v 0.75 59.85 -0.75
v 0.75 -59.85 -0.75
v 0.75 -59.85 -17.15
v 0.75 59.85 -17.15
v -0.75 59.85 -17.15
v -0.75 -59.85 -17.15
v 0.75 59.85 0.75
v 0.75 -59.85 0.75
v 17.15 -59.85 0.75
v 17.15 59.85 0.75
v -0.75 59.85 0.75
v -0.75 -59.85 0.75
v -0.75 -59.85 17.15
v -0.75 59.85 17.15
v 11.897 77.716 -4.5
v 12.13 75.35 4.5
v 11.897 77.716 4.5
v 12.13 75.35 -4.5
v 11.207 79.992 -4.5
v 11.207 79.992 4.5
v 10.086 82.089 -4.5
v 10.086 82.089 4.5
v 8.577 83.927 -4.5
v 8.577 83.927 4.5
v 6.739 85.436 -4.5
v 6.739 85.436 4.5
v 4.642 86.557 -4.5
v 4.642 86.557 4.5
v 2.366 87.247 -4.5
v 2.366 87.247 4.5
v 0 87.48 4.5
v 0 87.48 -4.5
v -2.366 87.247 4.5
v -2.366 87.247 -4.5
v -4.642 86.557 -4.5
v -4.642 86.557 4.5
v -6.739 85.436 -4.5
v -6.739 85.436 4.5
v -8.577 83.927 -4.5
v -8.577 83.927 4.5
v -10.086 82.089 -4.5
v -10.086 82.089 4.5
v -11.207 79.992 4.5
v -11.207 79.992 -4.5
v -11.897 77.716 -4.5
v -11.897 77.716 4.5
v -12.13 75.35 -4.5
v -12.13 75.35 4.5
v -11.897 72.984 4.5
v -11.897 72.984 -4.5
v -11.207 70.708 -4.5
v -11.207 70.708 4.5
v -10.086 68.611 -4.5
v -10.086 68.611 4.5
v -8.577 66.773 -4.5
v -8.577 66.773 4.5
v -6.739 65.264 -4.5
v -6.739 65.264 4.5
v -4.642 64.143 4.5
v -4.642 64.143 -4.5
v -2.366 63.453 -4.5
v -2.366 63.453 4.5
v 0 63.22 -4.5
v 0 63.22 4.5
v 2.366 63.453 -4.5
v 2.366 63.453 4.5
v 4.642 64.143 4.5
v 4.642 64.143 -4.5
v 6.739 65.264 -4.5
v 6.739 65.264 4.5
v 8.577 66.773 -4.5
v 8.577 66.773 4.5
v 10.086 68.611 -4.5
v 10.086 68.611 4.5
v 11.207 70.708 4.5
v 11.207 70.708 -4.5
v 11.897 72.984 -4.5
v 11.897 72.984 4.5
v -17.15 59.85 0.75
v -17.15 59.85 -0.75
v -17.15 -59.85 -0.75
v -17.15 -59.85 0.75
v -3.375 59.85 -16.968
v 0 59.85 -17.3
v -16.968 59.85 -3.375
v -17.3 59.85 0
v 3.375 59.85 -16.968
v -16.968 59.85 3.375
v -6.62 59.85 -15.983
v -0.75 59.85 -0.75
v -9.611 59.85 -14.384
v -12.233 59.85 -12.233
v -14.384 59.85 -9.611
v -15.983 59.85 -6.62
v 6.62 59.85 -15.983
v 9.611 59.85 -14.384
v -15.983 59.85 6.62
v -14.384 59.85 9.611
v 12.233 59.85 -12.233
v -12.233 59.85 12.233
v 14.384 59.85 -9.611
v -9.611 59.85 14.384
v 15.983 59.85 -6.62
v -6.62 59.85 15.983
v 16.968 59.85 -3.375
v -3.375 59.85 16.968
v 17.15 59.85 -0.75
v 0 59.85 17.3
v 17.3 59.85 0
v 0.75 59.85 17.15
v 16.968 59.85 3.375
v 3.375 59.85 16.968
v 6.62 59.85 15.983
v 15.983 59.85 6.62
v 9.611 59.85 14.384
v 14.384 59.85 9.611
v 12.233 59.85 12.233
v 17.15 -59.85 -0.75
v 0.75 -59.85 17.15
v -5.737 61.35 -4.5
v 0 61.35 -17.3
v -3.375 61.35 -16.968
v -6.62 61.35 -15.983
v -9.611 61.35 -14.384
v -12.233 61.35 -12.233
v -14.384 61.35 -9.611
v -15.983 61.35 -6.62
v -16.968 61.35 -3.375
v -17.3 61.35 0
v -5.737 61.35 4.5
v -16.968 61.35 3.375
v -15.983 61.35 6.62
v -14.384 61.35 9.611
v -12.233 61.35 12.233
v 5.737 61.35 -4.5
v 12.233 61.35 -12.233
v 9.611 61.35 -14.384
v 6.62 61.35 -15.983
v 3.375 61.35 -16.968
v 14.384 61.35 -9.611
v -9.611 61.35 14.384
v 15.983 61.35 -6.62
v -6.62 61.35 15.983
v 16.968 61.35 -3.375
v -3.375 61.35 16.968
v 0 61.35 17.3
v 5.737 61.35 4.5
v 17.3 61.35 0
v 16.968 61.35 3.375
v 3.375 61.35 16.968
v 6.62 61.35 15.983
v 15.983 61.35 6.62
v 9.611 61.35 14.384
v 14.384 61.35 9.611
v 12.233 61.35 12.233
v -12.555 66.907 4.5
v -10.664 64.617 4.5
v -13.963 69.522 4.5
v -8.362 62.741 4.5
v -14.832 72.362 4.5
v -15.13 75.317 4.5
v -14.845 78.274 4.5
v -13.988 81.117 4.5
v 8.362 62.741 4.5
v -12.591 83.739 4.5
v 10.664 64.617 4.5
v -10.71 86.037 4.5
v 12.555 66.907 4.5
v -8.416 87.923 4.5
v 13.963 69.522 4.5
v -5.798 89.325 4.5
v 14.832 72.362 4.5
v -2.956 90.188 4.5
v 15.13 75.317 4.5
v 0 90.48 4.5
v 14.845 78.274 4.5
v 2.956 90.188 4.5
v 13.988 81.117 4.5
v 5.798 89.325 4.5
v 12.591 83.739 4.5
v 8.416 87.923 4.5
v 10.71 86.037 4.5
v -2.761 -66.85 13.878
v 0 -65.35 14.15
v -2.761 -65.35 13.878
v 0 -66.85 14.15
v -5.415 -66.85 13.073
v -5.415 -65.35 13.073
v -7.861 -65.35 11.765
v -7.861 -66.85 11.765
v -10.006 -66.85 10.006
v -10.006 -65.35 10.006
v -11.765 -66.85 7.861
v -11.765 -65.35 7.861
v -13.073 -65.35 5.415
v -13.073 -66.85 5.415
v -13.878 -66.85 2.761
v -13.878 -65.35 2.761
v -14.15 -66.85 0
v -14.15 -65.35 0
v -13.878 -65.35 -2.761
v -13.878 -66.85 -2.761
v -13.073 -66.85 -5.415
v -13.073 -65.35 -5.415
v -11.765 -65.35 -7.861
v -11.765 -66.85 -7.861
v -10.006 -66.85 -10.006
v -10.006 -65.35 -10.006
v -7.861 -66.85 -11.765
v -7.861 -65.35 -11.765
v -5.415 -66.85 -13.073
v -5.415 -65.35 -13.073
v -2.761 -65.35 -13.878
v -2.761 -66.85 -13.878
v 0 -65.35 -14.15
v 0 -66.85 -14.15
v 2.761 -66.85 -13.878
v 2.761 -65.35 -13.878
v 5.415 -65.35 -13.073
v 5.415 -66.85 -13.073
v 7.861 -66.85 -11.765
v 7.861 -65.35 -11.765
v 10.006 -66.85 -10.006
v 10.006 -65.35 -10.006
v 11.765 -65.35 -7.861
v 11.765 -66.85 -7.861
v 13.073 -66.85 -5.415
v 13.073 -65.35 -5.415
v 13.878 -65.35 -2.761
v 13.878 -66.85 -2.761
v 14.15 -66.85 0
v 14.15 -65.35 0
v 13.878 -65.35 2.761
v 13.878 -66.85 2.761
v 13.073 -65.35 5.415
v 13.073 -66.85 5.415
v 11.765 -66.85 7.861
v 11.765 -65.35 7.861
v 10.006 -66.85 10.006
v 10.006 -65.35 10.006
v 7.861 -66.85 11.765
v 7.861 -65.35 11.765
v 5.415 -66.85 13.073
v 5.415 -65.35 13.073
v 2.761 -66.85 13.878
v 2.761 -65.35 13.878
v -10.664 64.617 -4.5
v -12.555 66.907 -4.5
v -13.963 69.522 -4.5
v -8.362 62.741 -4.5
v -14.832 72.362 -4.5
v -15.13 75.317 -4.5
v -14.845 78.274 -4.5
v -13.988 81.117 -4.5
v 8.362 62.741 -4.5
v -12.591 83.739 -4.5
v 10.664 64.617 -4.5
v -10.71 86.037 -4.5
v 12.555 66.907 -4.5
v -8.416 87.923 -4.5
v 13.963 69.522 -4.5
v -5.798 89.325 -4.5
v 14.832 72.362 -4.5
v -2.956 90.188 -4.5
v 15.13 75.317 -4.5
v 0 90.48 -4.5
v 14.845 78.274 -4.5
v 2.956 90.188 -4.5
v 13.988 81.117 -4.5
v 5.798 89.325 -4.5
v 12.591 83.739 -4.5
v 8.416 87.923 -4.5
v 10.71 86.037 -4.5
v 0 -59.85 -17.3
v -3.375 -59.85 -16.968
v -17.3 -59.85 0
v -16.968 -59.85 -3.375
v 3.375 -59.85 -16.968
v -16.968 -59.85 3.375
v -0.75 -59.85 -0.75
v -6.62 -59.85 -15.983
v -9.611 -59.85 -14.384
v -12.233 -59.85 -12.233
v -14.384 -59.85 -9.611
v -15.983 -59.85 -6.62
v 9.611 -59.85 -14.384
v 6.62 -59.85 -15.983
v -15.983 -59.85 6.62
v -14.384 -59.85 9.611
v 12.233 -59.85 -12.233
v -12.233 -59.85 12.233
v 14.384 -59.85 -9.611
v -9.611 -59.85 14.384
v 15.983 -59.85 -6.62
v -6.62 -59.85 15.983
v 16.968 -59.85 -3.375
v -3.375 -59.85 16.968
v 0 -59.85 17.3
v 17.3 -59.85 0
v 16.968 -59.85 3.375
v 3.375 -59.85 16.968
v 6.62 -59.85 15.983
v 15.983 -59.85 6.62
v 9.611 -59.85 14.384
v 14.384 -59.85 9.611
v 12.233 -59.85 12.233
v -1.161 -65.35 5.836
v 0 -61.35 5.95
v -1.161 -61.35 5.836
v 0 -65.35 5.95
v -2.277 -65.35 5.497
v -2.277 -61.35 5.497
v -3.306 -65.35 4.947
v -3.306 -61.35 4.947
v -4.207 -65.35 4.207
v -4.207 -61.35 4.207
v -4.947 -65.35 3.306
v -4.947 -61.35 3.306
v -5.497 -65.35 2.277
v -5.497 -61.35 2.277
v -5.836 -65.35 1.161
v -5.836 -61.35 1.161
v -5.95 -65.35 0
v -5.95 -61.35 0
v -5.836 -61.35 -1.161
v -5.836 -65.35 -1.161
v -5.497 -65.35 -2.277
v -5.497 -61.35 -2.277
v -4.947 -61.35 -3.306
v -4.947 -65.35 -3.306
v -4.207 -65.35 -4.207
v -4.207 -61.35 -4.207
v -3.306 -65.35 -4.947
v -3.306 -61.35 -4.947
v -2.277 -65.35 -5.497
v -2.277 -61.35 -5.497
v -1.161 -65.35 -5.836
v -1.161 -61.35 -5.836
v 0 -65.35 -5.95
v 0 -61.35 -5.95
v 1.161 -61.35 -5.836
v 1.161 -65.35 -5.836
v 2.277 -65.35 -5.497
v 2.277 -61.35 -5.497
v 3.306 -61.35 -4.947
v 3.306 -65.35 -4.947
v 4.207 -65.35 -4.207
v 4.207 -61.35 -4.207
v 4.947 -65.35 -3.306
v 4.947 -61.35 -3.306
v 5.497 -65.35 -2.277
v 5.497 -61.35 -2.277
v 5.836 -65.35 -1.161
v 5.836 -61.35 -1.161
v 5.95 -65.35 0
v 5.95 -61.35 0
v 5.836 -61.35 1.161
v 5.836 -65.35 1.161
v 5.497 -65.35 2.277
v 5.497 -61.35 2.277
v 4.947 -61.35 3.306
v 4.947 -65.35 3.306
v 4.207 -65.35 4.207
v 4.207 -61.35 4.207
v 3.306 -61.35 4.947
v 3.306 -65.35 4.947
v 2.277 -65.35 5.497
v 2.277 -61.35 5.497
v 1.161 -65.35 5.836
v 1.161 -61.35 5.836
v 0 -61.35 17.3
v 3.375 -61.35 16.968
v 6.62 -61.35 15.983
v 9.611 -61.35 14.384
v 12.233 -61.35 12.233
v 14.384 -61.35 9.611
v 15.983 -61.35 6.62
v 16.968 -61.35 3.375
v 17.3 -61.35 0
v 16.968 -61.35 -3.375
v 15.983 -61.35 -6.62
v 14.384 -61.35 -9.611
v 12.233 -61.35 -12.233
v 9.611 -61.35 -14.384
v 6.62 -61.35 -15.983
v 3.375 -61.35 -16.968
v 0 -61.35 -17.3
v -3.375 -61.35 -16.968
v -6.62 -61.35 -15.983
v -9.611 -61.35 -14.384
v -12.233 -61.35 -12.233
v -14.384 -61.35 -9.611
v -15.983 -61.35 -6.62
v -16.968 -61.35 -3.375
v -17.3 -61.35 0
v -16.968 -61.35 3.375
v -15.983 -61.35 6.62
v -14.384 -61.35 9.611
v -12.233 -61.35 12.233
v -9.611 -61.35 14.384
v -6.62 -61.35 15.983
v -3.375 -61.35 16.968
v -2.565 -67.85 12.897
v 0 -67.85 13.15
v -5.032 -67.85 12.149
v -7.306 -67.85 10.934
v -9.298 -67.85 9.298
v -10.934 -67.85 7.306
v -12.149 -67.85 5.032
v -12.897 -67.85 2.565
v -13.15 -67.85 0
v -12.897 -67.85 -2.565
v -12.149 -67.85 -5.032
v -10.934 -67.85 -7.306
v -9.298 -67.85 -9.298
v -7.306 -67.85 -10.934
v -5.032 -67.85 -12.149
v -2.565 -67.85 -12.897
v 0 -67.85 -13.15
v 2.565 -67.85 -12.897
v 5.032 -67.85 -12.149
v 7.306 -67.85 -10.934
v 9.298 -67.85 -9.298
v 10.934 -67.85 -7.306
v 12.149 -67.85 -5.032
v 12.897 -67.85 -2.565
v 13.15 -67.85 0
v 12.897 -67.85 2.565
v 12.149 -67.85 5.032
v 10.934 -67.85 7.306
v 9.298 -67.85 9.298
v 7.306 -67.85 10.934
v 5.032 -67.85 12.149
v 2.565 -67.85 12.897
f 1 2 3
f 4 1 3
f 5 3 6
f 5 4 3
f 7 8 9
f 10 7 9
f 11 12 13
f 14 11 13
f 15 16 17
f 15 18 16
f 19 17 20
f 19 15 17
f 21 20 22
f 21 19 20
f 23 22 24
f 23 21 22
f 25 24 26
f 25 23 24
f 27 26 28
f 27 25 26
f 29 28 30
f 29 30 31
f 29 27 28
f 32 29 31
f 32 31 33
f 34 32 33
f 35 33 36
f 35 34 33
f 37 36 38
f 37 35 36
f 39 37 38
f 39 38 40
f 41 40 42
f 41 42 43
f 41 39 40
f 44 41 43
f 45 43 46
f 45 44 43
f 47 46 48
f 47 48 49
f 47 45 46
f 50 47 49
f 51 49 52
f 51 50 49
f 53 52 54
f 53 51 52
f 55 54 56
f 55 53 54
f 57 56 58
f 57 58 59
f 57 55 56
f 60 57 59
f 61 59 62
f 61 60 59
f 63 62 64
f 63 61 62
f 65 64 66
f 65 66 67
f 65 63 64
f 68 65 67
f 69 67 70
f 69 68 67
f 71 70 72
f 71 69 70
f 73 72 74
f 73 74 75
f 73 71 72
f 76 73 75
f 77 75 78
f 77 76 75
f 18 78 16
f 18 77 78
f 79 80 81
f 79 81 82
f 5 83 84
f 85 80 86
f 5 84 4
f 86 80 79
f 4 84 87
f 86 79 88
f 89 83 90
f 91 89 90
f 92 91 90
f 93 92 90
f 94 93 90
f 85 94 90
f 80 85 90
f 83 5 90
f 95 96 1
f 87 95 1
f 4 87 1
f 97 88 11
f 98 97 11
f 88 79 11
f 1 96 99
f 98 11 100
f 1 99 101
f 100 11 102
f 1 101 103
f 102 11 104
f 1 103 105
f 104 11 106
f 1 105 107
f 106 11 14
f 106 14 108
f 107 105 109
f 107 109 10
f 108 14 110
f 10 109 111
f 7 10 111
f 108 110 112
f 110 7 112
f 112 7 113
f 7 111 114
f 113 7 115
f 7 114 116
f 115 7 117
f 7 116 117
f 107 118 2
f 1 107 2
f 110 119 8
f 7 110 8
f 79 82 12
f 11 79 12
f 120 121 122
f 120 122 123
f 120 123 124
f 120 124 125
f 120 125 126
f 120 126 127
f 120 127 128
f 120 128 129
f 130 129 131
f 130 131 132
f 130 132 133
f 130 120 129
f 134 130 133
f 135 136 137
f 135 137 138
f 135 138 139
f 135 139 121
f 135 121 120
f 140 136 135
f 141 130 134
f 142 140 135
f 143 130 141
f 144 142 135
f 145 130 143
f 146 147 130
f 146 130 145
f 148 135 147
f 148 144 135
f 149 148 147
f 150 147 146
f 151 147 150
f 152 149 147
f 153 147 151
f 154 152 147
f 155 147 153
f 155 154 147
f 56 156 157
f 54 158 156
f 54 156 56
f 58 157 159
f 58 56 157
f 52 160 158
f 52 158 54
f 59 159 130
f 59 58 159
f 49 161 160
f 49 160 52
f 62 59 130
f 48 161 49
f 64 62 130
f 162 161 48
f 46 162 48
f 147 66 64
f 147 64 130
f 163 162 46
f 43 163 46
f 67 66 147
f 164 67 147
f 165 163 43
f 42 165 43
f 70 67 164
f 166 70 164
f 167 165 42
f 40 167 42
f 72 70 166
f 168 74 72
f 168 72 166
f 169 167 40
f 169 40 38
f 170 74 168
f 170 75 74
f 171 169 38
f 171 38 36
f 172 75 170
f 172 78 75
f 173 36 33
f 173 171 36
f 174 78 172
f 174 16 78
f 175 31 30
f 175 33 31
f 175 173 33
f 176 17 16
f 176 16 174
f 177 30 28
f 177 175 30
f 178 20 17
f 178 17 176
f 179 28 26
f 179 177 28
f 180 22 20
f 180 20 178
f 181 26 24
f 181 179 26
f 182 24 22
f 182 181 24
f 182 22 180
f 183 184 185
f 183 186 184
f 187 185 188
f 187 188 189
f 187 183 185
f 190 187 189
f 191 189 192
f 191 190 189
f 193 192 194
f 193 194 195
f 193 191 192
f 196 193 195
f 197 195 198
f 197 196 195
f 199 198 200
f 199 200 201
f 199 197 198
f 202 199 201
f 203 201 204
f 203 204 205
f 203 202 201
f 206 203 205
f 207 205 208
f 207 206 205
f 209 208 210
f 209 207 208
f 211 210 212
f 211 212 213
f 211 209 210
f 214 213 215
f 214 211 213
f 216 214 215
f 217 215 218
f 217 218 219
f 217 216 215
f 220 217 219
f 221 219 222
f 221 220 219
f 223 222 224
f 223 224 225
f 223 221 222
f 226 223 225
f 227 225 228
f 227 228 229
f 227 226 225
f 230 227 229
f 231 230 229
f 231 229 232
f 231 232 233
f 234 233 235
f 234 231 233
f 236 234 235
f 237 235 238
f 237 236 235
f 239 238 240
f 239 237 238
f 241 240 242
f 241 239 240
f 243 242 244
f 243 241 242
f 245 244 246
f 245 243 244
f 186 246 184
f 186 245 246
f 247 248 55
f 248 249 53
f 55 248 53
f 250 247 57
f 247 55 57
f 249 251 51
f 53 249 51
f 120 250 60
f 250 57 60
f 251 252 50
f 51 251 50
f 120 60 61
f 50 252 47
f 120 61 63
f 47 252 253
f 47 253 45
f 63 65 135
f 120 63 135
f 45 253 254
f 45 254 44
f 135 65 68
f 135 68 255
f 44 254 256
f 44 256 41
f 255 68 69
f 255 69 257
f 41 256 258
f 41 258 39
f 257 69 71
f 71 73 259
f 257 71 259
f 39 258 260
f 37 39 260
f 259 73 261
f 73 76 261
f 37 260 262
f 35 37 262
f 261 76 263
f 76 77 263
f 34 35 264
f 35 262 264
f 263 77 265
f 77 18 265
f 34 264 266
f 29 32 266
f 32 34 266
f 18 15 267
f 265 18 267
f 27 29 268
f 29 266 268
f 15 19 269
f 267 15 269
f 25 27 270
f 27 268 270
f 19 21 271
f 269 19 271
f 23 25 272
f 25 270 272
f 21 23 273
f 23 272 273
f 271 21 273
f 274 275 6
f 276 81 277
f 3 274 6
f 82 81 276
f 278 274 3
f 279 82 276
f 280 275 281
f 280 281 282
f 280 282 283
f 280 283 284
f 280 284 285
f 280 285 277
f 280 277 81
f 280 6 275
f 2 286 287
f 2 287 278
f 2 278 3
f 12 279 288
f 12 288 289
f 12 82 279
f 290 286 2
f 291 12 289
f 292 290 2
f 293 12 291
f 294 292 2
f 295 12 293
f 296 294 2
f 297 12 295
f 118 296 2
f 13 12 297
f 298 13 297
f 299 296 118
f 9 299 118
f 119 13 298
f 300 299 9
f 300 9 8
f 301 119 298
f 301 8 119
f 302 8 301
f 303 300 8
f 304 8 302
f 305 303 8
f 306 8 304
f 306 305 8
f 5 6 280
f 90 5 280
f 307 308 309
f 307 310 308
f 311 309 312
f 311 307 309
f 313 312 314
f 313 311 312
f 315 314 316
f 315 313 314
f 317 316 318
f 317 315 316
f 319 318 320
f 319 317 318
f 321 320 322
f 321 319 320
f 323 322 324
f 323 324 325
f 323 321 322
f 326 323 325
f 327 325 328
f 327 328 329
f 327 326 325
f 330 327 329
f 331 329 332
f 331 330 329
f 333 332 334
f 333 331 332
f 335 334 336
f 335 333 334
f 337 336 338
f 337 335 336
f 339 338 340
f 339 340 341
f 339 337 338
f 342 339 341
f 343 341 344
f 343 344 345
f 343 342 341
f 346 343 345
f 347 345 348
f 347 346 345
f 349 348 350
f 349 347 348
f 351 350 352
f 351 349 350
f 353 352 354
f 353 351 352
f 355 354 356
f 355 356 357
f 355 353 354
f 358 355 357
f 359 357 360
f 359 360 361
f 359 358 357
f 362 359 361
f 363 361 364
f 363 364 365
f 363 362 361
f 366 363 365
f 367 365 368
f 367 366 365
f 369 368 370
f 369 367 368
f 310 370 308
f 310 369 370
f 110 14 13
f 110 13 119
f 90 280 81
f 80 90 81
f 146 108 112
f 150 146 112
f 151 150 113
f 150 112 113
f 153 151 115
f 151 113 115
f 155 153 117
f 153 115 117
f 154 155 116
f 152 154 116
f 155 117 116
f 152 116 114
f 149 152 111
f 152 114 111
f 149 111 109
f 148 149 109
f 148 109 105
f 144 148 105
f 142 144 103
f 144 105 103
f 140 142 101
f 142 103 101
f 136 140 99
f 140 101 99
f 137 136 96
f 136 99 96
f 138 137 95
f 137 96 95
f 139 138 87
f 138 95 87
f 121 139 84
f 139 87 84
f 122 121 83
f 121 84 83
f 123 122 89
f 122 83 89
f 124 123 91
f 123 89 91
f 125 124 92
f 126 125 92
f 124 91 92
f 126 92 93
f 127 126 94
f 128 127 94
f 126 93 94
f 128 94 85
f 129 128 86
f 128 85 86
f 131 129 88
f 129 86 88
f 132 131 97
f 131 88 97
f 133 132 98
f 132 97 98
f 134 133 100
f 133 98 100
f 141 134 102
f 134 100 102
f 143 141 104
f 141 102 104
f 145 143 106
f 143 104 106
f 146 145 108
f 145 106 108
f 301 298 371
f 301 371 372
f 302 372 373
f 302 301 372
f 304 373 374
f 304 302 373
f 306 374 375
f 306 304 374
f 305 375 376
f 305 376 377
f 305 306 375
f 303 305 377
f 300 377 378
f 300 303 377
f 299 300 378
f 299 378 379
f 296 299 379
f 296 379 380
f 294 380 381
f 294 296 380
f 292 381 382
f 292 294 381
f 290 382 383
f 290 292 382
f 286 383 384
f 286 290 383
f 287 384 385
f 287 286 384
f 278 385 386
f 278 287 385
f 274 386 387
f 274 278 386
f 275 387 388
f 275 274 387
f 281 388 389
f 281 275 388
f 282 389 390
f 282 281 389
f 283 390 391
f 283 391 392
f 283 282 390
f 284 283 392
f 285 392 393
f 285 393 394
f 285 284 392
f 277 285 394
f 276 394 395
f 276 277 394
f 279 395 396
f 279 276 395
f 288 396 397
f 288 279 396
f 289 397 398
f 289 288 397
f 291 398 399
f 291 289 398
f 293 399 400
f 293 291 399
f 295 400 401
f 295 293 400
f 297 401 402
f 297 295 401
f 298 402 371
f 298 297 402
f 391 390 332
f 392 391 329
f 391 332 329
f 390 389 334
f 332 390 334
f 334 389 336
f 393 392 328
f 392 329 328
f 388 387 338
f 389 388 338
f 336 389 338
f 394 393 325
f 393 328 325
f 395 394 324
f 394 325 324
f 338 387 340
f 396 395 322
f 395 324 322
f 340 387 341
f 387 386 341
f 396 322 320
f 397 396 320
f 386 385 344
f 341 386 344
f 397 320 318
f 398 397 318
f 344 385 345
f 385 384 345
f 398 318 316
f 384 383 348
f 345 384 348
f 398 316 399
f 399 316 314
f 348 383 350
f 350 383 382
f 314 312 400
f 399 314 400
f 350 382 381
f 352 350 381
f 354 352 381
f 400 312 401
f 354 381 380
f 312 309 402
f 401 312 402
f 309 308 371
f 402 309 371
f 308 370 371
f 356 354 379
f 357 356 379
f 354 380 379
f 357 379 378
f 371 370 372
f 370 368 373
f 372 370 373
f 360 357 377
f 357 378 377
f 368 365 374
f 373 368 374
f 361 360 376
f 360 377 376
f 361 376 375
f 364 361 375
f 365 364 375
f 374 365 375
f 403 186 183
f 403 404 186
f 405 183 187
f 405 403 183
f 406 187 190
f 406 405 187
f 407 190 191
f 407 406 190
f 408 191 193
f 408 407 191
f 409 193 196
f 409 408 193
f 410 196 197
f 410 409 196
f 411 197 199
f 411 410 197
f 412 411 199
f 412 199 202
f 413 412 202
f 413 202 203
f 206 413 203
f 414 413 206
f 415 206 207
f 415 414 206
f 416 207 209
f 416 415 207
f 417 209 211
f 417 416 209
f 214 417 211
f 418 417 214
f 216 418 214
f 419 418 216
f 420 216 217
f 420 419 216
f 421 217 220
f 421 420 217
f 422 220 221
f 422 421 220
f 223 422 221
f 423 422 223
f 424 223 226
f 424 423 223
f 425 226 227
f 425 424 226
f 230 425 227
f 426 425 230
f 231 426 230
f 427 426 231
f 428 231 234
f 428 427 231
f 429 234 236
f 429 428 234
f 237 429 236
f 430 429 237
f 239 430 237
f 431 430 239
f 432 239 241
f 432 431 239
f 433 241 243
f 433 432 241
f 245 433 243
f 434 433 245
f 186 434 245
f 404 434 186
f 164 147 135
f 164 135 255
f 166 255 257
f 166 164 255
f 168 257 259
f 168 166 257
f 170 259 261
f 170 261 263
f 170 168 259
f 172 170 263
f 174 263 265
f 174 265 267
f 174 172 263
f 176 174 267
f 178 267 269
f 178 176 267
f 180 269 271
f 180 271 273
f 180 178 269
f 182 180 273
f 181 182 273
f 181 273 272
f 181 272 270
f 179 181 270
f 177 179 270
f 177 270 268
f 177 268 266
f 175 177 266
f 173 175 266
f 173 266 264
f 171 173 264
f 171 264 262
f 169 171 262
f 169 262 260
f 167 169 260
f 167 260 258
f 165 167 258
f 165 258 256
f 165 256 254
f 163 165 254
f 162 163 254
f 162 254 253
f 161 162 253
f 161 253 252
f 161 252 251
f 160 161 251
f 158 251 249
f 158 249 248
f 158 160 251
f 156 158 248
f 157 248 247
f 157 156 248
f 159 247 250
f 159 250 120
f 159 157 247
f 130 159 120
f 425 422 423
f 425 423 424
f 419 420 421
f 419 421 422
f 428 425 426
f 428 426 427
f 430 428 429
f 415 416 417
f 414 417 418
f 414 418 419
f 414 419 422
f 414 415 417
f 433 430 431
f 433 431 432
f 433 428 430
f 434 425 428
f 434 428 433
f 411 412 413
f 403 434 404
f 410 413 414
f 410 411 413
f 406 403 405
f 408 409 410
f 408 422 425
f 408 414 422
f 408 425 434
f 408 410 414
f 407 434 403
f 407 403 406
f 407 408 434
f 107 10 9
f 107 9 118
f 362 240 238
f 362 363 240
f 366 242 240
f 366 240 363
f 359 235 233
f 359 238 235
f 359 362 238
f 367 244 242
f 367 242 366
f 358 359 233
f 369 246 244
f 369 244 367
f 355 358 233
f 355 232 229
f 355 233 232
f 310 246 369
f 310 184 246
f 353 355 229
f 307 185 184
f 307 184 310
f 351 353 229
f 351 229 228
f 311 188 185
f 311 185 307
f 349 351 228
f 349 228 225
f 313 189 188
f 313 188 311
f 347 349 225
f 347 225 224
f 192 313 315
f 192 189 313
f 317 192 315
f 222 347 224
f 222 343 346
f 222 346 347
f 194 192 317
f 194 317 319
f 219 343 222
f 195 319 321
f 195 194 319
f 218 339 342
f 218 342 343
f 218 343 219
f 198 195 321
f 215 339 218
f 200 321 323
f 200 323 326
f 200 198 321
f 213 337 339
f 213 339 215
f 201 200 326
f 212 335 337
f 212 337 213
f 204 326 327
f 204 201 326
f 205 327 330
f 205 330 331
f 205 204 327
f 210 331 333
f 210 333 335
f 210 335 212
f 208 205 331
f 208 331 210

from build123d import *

# Parameters (mm, degrees)
BOSS_EXTRUDE1_DEPTH = 59.85
SKETCH2_R           = 17.3
BOSS_EXTRUDE2_DEPTH = 1.5
SKETCH3_R           = 15.13
SKETCH3_R_2         = 12.13
BOSS_EXTRUDE3_DEPTH = 4.5


with BuildPart() as part:
    # Sketch1 → Boss-Extrude1 (new, symmetric)
    with BuildSketch(Plane(origin=(0, 0, 0), x_dir=(1, 0, 0), z_dir=(0, 1, 0))):
        Polygon((-0.75, 0.75), (-17.15, 0.75), (-17.15, -0.75), (-0.75, -0.75), (-0.75, -17.15), (0.75, -17.15), (0.75, -0.75), (17.15, -0.75), (17.15, 0.75), (0.75, 0.75), (0.75, 17.15), (-0.75, 17.15), align=None)
    extrude(amount=BOSS_EXTRUDE1_DEPTH, both=True)

    # Sketch2 → Boss-Extrude2 (add)
    with BuildSketch(Plane(origin=(0, 59.85, 0), x_dir=(1, 0, 0), z_dir=(0, 1, 0))):
        with Locations(Location((0, 0, 0), (0, 0, 270))):
            Circle(SKETCH2_R)
    boss_extrude2 = extrude(amount=BOSS_EXTRUDE2_DEPTH)

    # Mirror1: Boss-Extrude2 across plane
    add(boss_extrude2.mirror(Plane.ZX))

    # Sketch3 → Boss-Extrude3 (add, symmetric)
    with BuildSketch(Plane.XY):
        with Locations((0, 75.35)):
            Circle(SKETCH3_R)
        with Locations((0, 75.35)):
            Circle(SKETCH3_R_2, mode=Mode.SUBTRACT)
    extrude(amount=BOSS_EXTRUDE3_DEPTH, both=True)

    # Sketch4 → Revolve1 (revolve)
    with BuildSketch(Plane(origin=(0, 0, 0), x_dir=(0, 0, -1), z_dir=(1, 0, 0))):
        Polygon((-5.95, -61.35), (-5.95, -65.35), (-14.15, -65.35), (-14.15, -66.85), (-13.15, -67.85), (0, -67.85), (0, -61.35), align=None)
    revolve(axis=Axis((0, -54.373859454, 0), (0, -1, 0)))


solid = part.part
